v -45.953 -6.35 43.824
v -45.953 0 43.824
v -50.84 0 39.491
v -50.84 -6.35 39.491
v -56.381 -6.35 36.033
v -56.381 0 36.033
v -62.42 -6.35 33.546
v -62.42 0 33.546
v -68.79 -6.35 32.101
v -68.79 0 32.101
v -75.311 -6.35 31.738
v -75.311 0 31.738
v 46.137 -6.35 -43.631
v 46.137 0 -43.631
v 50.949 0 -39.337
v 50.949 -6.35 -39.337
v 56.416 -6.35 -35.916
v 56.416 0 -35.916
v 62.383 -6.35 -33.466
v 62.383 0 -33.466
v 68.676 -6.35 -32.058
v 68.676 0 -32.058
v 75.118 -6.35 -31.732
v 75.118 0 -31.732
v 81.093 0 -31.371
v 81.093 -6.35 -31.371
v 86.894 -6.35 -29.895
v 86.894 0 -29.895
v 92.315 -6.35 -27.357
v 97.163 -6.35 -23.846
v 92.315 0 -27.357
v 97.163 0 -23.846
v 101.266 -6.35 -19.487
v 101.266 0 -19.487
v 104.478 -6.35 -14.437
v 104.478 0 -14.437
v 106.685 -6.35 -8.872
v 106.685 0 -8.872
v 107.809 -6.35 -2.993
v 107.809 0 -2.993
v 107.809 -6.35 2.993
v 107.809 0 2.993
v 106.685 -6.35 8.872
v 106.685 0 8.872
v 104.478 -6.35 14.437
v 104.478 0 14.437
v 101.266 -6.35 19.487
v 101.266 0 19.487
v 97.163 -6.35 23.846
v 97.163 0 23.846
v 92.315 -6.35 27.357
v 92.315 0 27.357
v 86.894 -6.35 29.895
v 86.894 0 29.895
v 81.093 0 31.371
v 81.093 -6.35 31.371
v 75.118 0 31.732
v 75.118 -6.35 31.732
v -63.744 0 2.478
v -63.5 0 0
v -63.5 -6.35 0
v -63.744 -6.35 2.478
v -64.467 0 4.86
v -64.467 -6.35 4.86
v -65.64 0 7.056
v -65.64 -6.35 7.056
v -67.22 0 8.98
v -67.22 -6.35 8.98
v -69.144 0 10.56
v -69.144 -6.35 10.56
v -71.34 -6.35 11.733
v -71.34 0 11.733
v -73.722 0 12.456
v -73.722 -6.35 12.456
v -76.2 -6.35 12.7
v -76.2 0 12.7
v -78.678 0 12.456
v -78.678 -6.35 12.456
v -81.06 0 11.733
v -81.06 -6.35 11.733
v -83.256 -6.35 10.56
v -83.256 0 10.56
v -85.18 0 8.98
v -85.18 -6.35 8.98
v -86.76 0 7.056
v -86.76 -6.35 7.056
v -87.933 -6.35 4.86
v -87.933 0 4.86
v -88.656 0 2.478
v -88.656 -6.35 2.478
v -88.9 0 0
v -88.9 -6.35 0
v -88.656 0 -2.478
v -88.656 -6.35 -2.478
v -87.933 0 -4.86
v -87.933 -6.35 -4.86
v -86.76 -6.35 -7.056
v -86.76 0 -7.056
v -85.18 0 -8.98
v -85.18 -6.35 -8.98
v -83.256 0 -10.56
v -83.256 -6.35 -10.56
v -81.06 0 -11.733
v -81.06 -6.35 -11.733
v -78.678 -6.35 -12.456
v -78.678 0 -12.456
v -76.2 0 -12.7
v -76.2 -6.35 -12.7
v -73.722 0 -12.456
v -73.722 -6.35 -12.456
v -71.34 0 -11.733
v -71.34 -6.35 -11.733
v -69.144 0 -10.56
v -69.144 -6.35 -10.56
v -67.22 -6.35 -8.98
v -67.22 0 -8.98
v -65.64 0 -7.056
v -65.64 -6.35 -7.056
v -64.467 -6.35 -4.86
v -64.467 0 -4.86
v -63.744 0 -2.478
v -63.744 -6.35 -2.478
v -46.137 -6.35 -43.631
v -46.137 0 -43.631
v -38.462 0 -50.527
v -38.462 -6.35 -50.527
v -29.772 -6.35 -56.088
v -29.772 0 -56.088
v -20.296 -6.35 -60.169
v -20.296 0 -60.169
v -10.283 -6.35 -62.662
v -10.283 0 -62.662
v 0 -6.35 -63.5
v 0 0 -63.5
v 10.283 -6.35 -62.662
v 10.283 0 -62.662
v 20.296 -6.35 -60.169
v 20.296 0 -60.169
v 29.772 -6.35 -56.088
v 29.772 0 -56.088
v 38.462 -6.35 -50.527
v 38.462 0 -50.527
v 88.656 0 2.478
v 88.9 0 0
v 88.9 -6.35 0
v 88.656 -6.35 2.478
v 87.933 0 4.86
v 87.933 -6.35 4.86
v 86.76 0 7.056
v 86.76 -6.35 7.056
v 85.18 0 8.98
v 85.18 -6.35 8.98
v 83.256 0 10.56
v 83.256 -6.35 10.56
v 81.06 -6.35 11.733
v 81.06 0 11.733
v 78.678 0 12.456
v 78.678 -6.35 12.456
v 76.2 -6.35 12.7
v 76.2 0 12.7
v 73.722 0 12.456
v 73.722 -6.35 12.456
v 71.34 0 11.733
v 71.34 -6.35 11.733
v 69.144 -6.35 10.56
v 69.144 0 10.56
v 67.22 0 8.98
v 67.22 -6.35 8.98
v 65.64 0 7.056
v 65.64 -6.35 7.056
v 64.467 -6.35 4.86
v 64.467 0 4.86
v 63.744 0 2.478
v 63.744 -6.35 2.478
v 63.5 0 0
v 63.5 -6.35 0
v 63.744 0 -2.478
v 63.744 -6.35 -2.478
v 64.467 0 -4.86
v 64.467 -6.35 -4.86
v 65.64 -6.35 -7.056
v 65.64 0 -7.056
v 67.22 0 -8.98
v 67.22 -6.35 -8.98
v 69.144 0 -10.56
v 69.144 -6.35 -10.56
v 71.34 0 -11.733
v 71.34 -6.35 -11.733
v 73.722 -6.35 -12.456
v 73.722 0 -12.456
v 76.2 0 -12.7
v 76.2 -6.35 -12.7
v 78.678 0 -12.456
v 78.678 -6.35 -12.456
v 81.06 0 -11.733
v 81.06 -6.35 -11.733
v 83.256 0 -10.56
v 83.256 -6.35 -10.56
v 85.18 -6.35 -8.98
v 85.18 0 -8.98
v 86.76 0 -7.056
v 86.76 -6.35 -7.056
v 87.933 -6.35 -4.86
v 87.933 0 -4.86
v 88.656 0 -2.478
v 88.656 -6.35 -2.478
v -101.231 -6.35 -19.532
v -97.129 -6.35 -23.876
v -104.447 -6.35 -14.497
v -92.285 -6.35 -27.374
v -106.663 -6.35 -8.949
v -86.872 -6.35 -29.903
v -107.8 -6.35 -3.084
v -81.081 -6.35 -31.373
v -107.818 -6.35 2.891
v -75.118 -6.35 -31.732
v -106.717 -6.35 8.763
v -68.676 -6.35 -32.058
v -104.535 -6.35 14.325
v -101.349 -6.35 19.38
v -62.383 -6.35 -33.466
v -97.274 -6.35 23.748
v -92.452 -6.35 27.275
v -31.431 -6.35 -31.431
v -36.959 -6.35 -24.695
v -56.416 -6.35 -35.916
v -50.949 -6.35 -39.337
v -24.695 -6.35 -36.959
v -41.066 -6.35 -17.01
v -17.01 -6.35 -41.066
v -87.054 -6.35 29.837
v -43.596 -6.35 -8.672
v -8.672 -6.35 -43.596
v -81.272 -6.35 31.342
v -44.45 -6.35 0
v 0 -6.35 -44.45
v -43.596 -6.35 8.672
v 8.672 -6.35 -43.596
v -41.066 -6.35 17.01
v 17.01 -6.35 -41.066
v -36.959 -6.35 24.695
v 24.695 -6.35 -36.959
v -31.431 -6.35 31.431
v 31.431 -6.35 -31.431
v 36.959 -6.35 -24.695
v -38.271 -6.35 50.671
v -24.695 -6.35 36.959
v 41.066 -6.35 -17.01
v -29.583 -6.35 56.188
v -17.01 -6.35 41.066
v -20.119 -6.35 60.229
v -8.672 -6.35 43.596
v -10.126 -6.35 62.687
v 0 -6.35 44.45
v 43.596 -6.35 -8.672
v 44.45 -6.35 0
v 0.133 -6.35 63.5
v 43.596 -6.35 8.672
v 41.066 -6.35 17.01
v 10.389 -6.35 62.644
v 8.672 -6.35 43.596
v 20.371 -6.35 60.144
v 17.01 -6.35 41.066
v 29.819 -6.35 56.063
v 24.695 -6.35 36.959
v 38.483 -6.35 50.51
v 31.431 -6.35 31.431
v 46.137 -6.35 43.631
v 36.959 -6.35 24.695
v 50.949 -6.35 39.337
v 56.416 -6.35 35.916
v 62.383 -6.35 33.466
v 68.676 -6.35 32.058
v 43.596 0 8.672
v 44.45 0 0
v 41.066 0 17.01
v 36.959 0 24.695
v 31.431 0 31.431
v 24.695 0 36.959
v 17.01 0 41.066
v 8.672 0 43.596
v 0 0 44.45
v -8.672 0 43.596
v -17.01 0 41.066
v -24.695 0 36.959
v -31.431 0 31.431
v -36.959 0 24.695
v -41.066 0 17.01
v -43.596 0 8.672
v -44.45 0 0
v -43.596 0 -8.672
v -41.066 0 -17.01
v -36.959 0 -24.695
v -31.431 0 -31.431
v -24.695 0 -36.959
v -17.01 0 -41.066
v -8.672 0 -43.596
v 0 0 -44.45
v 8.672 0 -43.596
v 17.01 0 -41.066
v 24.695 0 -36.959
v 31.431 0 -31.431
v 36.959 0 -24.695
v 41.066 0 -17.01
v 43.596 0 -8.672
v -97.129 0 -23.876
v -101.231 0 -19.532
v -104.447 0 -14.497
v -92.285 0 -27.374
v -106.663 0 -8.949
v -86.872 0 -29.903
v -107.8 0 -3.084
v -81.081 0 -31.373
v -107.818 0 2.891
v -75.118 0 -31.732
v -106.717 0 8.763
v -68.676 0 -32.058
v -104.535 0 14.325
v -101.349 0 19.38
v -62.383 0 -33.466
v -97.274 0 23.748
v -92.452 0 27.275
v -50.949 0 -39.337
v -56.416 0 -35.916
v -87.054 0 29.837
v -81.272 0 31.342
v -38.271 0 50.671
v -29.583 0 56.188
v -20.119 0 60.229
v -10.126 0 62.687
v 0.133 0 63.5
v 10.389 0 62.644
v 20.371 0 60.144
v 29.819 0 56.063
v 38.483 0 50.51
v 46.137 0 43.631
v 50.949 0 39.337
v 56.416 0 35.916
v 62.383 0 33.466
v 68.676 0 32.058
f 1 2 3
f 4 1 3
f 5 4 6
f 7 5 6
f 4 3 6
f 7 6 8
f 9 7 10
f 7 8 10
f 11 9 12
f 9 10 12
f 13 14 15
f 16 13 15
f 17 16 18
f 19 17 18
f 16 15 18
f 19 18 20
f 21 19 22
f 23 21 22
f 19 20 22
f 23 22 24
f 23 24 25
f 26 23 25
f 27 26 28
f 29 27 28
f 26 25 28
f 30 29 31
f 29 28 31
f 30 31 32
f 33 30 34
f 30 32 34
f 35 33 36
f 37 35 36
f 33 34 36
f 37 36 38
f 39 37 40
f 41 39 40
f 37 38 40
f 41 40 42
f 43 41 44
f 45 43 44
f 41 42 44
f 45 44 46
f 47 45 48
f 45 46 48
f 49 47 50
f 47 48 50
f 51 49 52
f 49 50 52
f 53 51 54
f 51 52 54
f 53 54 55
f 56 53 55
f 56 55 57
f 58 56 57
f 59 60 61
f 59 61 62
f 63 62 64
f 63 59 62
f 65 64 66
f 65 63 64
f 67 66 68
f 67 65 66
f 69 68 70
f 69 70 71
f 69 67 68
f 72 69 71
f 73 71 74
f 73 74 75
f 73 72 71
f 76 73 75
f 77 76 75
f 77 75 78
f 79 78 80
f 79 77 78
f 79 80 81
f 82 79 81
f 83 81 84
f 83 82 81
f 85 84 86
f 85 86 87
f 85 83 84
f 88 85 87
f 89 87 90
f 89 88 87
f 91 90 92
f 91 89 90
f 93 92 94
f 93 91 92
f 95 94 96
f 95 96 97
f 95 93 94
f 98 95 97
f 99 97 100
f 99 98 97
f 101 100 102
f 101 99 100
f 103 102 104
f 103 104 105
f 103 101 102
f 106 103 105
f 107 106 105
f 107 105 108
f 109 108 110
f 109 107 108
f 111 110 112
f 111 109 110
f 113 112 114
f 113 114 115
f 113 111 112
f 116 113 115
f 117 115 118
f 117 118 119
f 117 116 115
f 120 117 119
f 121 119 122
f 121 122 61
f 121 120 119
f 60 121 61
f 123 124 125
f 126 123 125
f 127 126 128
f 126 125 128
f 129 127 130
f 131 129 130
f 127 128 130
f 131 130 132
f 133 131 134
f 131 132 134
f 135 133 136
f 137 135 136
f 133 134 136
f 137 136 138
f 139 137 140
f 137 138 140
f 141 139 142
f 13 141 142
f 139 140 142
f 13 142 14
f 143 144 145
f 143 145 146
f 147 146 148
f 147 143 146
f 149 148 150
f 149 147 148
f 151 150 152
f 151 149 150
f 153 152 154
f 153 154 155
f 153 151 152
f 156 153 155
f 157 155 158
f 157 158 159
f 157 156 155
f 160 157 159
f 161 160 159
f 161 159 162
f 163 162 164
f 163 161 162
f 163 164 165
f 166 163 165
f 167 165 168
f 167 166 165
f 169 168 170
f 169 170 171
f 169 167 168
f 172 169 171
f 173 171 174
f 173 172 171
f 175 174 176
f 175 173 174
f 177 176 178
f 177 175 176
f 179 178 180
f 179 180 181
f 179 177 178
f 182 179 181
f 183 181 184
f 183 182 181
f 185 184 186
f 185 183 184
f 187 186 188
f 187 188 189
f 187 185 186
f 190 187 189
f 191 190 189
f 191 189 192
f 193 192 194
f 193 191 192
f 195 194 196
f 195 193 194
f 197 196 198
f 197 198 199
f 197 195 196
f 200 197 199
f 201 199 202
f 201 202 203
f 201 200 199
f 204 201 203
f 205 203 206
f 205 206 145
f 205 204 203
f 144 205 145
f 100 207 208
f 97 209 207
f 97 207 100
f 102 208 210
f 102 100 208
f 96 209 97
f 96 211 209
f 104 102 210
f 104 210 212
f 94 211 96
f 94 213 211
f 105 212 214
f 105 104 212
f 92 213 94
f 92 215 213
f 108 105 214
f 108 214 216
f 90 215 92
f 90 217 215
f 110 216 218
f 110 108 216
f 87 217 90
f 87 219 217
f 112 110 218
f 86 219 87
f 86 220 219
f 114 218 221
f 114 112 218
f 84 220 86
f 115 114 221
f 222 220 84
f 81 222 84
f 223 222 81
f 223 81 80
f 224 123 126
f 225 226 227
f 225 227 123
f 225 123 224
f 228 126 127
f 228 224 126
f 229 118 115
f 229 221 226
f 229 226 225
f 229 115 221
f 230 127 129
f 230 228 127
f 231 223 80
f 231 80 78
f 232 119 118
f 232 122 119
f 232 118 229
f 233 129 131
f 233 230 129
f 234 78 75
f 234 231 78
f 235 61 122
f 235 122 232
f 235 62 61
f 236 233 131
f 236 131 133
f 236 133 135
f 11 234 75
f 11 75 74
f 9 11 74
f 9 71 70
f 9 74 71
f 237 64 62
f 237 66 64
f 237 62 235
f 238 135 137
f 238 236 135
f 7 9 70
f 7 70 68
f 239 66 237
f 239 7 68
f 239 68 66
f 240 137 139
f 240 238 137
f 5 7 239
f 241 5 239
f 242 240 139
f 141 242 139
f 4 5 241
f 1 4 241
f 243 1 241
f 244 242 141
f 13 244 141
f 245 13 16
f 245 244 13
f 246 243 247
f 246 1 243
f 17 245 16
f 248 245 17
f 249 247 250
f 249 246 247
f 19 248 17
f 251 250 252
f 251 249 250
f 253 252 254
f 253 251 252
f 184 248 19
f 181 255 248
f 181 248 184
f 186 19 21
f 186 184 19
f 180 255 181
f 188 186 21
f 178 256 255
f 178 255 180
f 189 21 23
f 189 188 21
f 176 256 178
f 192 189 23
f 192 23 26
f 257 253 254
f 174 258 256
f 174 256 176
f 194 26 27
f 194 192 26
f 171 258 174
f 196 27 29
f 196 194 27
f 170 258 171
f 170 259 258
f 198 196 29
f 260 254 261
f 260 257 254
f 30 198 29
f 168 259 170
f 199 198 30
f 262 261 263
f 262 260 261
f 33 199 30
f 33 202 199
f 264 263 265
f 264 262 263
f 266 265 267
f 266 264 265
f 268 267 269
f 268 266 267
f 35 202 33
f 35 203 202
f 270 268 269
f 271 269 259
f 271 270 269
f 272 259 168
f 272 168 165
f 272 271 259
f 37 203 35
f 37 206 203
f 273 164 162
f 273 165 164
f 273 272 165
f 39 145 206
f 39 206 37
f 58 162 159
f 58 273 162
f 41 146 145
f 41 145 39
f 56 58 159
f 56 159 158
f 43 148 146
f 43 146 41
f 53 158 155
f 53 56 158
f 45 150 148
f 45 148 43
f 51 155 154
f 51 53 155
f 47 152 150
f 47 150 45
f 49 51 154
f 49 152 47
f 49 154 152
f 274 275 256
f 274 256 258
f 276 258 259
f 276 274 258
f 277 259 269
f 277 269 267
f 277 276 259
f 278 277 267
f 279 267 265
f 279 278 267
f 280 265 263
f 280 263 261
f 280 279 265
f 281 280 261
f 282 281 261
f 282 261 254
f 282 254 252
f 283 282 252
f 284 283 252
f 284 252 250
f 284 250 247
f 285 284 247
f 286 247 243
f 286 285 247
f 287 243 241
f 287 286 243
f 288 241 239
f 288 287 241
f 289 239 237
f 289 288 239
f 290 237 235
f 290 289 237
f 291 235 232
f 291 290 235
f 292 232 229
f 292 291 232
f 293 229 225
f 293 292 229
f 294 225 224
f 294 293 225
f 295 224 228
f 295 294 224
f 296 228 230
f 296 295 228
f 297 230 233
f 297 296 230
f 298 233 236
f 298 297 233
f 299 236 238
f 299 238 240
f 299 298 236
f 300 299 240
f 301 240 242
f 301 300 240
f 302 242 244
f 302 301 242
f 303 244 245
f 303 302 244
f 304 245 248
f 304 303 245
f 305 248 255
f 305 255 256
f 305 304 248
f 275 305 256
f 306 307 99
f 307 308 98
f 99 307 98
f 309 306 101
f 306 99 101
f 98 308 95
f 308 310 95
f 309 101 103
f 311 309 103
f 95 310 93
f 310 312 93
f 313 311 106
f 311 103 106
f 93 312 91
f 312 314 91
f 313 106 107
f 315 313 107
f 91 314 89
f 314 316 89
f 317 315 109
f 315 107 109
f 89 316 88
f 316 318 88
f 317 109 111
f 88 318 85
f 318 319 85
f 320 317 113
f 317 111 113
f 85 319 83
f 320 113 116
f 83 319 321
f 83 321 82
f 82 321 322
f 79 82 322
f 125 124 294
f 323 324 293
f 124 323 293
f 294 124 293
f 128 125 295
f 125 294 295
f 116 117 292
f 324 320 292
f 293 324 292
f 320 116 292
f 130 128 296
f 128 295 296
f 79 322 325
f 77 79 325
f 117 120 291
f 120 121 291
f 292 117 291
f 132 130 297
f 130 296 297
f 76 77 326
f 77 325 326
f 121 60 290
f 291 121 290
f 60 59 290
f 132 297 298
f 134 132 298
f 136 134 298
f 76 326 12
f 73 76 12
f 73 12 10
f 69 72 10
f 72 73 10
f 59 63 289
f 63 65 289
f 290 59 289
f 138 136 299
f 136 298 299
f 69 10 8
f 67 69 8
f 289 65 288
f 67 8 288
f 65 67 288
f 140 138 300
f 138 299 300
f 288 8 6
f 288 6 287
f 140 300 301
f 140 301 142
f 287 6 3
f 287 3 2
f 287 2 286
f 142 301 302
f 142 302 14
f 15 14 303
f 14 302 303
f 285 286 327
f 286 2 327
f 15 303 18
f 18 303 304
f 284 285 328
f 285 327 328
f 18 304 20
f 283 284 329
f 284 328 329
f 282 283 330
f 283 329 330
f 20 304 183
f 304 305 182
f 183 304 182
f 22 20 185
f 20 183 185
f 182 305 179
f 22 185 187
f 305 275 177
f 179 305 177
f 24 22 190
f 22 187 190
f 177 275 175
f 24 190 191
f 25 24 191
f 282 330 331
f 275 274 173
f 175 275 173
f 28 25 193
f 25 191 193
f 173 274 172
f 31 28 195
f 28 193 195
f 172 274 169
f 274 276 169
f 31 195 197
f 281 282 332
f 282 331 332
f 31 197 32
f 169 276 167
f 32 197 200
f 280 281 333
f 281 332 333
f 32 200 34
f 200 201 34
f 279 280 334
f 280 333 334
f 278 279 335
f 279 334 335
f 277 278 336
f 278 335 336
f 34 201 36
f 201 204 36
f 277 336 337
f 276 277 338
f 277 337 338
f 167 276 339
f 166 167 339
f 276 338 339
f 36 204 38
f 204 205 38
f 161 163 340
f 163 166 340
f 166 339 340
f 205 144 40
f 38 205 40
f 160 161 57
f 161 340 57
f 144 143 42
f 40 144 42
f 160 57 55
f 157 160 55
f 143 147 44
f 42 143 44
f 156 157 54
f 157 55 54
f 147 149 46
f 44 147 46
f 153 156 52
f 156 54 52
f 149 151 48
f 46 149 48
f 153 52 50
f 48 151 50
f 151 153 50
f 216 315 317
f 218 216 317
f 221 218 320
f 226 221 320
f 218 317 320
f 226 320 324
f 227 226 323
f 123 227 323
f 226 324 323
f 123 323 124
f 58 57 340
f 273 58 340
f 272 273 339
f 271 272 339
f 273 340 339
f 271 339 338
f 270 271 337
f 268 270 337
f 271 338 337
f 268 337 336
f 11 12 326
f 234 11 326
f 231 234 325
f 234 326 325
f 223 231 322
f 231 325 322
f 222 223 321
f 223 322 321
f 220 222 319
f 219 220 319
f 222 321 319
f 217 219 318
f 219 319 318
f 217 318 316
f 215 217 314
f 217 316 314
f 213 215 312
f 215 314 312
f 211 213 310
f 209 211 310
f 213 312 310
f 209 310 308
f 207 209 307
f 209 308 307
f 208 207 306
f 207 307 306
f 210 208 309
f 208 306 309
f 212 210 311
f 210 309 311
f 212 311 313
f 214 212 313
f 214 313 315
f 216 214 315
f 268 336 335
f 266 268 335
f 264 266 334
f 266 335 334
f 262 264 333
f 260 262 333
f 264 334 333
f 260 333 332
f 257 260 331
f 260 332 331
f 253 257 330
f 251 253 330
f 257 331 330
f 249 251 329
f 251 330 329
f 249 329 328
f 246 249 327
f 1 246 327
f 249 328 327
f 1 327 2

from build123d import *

# Parameters (mm, degrees)
F0_R     = 12.7
F0_R_2   = 44.45
F1_DEPTH = 6.35


# Not quite as in the source:
# - a length typed as a fraction of an inch, garbled in the dataset ("3 / 203.2 mm" for 3/8 in), is restored


with BuildPart() as f1:
    # F0 (on Front) → F1 (new body)
    with BuildSketch(Plane.XZ):
        with BuildLine():
            ThreePointArc((-75.1176136364, -31.7315448688), (-59.3475236203, -34.5646316236), (-46.13671875, -43.6308741946))
            ThreePointArc((-46.13671875, -43.6308741946), (0, -63.5), (46.13671875, -43.6308741946))
            ThreePointArc((46.13671875, -43.6308741946), (59.3475236203, -34.5646316236), (75.1176136364, -31.7315448688))
            ThreePointArc((75.1176136364, -31.7315448688), (107.95, 0), (75.1176136364, 31.7315448688))
            ThreePointArc((75.1176136364, 31.7315448688), (59.3475236203, 34.5646316236), (46.13671875, 43.6308741946))
            ThreePointArc((46.13671875, 43.6308741946), (0.1332471885, 63.4998601982), (-45.9532044665, 43.8241143579))
            ThreePointArc((-45.9532044665, 43.8241143579), (-59.3485408179, 34.6632102418), (-75.3109250125, 31.7375494591))
            ThreePointArc((-75.3109250125, 31.7375494591), (-107.9498527345, -0.0967023051), (-75.1176136364, -31.7315448688))
        make_face()
        with Locations((-76.2, 0)):
            Circle(F0_R, mode=Mode.SUBTRACT)
        Circle(F0_R_2, mode=Mode.SUBTRACT)
        with Locations((76.2, 0)):
            Circle(F0_R, mode=Mode.SUBTRACT)
    extrude(amount=F1_DEPTH)


solid = f1.part
